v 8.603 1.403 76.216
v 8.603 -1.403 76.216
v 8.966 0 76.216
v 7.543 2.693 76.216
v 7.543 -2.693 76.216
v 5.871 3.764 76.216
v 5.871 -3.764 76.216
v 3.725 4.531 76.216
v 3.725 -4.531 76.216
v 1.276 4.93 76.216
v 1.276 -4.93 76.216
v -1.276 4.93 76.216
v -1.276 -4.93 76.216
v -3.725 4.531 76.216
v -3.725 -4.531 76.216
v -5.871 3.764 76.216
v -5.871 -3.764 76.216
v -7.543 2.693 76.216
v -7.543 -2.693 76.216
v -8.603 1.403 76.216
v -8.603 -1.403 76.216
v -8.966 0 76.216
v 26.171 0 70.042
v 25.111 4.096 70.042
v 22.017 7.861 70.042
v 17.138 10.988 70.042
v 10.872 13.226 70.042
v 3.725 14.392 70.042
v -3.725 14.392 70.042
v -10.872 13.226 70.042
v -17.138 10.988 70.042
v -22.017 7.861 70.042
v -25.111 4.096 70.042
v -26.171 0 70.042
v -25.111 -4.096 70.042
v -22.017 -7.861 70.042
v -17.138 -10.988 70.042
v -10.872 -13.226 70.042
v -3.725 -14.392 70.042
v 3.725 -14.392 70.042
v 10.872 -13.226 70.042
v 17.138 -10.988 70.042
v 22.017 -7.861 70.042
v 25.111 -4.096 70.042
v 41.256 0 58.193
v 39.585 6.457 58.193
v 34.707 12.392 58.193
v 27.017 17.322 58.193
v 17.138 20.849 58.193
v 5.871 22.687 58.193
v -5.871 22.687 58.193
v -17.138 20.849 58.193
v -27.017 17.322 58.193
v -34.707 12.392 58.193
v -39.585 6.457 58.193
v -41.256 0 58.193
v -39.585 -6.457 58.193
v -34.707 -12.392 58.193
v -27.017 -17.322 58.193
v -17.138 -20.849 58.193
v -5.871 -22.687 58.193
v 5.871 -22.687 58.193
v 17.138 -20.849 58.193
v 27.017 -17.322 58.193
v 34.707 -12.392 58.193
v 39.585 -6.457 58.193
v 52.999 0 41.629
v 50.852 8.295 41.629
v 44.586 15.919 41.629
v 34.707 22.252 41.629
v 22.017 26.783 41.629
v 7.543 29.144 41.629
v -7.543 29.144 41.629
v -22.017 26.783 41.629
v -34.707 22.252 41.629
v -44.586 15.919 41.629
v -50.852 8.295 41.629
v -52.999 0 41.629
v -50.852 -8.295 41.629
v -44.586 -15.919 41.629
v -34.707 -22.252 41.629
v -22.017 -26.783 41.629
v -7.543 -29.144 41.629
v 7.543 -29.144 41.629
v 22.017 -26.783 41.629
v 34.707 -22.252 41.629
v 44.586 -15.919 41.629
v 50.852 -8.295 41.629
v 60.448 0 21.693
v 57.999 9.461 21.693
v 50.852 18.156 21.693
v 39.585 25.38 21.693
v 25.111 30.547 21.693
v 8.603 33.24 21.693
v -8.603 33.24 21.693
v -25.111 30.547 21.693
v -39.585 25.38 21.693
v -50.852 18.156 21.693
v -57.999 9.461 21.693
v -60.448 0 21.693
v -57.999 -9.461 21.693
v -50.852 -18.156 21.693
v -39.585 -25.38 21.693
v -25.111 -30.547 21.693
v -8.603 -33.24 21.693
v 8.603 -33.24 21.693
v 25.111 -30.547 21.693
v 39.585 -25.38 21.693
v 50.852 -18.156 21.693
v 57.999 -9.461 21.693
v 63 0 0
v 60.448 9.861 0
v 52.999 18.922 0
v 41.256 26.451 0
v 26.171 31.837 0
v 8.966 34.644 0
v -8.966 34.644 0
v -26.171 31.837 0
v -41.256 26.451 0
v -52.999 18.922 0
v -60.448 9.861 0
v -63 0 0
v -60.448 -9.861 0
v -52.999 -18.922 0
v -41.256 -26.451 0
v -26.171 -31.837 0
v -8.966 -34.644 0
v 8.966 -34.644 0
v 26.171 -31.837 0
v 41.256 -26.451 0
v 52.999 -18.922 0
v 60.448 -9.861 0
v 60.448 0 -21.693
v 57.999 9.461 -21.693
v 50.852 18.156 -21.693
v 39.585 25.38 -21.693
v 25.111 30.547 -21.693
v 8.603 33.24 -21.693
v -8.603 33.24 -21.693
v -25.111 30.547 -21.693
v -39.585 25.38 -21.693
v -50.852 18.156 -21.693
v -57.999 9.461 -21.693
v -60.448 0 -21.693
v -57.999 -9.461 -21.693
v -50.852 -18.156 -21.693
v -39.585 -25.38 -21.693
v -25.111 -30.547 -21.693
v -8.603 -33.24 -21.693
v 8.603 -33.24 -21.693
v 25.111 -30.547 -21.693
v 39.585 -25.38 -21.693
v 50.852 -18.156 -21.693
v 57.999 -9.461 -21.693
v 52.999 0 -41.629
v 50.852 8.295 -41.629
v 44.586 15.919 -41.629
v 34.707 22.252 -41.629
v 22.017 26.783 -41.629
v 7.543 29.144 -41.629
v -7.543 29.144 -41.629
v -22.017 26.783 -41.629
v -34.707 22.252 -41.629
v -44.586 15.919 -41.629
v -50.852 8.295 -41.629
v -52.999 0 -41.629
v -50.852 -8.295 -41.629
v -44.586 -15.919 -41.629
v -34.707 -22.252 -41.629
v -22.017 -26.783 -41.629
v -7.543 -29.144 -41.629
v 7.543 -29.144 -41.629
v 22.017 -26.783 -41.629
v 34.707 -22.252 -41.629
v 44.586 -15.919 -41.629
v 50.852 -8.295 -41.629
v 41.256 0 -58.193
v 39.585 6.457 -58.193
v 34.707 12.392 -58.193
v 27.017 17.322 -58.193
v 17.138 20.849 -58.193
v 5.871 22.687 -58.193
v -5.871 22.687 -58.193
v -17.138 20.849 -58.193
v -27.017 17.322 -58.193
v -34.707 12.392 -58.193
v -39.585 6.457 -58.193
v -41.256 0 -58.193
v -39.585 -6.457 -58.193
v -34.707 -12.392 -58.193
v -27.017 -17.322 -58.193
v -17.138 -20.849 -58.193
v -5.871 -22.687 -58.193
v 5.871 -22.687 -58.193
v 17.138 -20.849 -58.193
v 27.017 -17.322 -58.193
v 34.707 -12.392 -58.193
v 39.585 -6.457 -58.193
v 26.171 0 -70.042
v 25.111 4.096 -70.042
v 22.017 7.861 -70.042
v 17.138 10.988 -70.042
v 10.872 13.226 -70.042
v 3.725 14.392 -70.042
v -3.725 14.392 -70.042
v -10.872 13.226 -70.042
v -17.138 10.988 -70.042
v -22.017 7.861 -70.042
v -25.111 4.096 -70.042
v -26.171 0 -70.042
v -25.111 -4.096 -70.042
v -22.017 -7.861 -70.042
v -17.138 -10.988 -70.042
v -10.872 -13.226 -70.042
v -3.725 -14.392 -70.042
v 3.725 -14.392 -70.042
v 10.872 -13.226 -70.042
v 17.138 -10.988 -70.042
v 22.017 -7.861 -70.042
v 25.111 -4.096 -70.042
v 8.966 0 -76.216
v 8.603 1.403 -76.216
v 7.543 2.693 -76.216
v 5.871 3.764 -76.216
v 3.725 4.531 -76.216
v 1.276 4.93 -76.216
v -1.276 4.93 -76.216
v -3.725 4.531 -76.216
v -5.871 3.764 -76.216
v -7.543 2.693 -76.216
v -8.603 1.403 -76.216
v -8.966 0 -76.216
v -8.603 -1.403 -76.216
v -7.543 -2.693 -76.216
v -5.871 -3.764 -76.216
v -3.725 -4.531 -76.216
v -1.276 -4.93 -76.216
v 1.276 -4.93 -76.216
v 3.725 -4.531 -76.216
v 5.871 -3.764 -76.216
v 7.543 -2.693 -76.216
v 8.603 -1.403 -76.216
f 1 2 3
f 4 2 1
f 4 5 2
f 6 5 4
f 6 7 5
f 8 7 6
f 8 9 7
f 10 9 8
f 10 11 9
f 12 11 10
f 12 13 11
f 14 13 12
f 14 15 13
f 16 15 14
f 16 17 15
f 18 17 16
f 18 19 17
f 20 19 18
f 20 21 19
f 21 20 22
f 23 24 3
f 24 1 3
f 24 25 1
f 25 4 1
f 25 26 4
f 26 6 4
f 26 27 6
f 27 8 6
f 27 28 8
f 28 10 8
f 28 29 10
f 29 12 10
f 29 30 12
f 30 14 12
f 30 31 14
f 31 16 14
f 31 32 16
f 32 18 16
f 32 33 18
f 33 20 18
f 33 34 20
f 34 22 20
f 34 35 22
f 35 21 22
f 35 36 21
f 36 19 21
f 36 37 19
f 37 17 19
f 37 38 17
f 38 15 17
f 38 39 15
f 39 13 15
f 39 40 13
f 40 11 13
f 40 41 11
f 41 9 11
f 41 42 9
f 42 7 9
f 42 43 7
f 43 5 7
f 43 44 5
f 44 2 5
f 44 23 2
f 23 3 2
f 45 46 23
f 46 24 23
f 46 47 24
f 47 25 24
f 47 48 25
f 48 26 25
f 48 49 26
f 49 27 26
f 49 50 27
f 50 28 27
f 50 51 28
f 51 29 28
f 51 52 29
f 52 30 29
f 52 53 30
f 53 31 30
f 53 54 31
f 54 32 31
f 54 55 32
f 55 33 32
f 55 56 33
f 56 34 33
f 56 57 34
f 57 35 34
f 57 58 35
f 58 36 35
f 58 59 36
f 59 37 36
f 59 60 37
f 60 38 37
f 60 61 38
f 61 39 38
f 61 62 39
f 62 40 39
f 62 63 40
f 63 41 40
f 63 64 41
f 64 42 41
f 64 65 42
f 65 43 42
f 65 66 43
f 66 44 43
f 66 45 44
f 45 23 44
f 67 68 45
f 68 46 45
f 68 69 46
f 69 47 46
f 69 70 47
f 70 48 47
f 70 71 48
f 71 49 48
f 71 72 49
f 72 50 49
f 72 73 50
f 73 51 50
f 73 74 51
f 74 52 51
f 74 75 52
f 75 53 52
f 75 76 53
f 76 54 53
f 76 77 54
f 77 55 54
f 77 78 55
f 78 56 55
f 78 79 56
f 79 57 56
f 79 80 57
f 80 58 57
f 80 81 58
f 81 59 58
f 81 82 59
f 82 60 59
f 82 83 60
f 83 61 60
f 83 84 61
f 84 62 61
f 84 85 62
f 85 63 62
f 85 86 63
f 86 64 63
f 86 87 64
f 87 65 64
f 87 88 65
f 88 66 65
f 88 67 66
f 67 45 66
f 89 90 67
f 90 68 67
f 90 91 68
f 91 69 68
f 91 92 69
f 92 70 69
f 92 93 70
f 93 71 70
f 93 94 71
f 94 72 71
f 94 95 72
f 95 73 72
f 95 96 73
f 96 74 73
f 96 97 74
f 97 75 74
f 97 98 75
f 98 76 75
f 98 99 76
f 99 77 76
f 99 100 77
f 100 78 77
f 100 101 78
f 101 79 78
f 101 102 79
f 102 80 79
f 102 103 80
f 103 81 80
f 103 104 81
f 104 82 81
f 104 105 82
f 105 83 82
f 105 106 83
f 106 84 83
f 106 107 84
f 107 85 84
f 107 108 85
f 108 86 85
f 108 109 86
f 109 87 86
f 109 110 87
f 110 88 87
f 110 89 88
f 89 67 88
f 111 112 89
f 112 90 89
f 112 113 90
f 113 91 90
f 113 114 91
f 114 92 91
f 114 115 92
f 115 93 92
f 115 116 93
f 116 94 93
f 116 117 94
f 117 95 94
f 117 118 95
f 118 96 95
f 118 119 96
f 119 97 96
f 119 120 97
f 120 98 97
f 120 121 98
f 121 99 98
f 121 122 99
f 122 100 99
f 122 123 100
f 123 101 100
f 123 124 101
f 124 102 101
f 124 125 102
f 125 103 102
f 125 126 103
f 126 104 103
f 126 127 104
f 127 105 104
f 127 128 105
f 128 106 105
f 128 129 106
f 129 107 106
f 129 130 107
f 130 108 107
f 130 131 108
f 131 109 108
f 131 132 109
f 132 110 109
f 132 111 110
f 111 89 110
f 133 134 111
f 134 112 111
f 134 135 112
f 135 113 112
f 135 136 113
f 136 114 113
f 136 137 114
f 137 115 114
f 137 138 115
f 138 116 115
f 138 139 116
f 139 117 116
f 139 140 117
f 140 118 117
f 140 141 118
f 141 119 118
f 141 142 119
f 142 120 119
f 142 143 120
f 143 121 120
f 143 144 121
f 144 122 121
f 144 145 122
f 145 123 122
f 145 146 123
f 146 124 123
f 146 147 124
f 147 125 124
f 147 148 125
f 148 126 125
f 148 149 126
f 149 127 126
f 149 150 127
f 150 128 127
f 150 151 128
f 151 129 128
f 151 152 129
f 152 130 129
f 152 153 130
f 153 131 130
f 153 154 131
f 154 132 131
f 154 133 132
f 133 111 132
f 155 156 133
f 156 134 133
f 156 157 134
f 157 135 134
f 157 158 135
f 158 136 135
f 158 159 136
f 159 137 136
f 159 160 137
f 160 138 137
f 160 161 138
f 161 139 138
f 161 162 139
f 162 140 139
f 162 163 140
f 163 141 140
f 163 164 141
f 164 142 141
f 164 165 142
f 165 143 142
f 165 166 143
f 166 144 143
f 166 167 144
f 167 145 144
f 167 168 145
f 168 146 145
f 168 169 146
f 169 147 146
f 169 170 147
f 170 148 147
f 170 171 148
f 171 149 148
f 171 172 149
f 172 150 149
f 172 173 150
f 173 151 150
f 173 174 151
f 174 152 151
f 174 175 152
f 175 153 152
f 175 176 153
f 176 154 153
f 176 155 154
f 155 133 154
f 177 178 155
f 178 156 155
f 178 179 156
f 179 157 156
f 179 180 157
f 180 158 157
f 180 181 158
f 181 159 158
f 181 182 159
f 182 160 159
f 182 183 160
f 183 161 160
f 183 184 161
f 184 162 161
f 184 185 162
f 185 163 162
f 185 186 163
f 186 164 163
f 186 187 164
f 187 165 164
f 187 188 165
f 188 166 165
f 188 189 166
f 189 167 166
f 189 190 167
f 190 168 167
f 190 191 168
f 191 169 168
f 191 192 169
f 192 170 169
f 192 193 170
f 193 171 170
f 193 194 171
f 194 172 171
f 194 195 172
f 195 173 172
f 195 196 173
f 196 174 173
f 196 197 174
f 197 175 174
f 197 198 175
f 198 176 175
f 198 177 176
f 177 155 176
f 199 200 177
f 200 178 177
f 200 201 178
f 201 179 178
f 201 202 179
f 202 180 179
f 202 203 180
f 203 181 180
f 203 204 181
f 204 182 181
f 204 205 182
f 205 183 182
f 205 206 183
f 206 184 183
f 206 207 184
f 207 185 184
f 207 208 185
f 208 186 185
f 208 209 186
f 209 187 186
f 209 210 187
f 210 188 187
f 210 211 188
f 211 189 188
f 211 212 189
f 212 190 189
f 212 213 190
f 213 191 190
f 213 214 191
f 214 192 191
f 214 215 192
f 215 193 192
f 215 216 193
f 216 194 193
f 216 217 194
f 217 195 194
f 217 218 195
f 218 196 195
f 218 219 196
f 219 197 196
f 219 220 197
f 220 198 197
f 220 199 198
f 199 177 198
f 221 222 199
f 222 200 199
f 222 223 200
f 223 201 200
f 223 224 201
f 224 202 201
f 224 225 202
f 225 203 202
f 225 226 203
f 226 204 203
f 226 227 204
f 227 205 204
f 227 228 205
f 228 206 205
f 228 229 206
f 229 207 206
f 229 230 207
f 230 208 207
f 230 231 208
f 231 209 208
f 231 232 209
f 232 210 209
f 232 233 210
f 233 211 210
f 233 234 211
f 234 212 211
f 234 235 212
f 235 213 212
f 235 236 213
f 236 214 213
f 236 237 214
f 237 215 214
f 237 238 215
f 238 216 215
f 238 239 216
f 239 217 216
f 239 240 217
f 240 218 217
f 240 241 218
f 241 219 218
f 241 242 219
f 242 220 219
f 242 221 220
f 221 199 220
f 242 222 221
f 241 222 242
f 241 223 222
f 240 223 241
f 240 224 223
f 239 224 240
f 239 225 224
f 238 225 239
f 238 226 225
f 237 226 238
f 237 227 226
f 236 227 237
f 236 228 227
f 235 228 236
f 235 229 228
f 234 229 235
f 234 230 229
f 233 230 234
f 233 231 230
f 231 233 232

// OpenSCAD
// Generated by SolidPython 1.0.1 on 2020-07-29 00:46:48


scale(v = [9, 5, 11]) {
	sphere(r = 7);
}
/***********************************************
*********      SolidPython code:      **********
************************************************
 
# import packages: SolidPython
from solid import *
from solid.utils import *
from itertools import chain, combinations, permutations


class Resize:

    def __init__(self, scad_file):
        self.scad_file = scad_file
        #self.scad_file = import_scad(scad_file)
        # cone/cylinder param:
        self.r1 = 0
        self.r2 = 0
        self.h = 0
        # rectangular prism param:
        self.w = 0
        self.l = 0
        # ellipse param:
        self.r = 0

    # import OpenScad code (file name corresponds to shape)


    # classify shape + parameters
    def assign(self, param1, param2, param3):
        if self.scad_file == 'cone.scad':
            self.r1 = param1
            self.r2 = param2
            self.h = param3
        elif self.scad_file == 'cylinder.scad':
            self.r1 = param1
            self.r2 = param2
            self.h = param3
        elif self.scad_file == 'rectangularPrism.scad':
            self.h = param1
            self.l = param2
            self.w = param3
        else:
            self.r = param1
            self.h = param2

    # resize parameters
    def iterate(self):
        x = range(3, 20, 2)
        i = 1
        if self.scad_file == 'cone.scad':
            tempList = list(permutations(x, 2))
            for temp in tempList:
                param1 = temp[0]
                param2 = temp[1]
                filepath = 'produced_scad_files/' + 'cone' + str(param1) + '_' + str(param2) + '_' + '.scad'
                scad_render_to_file(cylinder(h=param1, r1=param2, r2=0), filepath)

        elif self.scad_file == 'cylinder.scad':
            tempList = list(permutations(x, 3))
            for temp in tempList:
                param1 = temp[0]
                param2 = temp[1]
                filepath = 'produced_scad_files/' + 'cylinder' + str(param1) + '_' + str(param2) + '_' + '.scad'
                scad_render_to_file(cylinder(h=param1, r1=param2, r2=param2), filepath)

        elif self.scad_file == 'rectangularPrism.scad':
            tempList = list(permutations(x, 3))
            for temp in tempList:
                param1 = temp[0]
                param2 = temp[1]
                param3 = temp[2]
                filepath = 'produced_scad_files/' + 'rectangularPrism' + str(param1) + '_' + str(param2) + '_' + str(
                    param3) + '.scad'
                scad_render_to_file(cube(size=(param1, param2, param3)), filepath)

        elif self.scad_file == 'ellipse.scad':
            tempList = list(permutations(x, 4))
            for temp in tempList:
                param1 = temp[0]
                param2 = temp[1]
                param3 = temp[2]
                param4 = temp[3]
                filepath = 'produced_scad_files/' + 'ellipse' + str(param1) + '_' + str(param2) + '_' + str(param3) + '_' + str(param4) + '.scad'
                scad_render_to_file(scale([param1, param2, param3])(sphere(r=param4)), filepath)

    def render_to_scadfile(self):
        scad_render_to_file(scad, 'example.scad') 
 
************************************************/
